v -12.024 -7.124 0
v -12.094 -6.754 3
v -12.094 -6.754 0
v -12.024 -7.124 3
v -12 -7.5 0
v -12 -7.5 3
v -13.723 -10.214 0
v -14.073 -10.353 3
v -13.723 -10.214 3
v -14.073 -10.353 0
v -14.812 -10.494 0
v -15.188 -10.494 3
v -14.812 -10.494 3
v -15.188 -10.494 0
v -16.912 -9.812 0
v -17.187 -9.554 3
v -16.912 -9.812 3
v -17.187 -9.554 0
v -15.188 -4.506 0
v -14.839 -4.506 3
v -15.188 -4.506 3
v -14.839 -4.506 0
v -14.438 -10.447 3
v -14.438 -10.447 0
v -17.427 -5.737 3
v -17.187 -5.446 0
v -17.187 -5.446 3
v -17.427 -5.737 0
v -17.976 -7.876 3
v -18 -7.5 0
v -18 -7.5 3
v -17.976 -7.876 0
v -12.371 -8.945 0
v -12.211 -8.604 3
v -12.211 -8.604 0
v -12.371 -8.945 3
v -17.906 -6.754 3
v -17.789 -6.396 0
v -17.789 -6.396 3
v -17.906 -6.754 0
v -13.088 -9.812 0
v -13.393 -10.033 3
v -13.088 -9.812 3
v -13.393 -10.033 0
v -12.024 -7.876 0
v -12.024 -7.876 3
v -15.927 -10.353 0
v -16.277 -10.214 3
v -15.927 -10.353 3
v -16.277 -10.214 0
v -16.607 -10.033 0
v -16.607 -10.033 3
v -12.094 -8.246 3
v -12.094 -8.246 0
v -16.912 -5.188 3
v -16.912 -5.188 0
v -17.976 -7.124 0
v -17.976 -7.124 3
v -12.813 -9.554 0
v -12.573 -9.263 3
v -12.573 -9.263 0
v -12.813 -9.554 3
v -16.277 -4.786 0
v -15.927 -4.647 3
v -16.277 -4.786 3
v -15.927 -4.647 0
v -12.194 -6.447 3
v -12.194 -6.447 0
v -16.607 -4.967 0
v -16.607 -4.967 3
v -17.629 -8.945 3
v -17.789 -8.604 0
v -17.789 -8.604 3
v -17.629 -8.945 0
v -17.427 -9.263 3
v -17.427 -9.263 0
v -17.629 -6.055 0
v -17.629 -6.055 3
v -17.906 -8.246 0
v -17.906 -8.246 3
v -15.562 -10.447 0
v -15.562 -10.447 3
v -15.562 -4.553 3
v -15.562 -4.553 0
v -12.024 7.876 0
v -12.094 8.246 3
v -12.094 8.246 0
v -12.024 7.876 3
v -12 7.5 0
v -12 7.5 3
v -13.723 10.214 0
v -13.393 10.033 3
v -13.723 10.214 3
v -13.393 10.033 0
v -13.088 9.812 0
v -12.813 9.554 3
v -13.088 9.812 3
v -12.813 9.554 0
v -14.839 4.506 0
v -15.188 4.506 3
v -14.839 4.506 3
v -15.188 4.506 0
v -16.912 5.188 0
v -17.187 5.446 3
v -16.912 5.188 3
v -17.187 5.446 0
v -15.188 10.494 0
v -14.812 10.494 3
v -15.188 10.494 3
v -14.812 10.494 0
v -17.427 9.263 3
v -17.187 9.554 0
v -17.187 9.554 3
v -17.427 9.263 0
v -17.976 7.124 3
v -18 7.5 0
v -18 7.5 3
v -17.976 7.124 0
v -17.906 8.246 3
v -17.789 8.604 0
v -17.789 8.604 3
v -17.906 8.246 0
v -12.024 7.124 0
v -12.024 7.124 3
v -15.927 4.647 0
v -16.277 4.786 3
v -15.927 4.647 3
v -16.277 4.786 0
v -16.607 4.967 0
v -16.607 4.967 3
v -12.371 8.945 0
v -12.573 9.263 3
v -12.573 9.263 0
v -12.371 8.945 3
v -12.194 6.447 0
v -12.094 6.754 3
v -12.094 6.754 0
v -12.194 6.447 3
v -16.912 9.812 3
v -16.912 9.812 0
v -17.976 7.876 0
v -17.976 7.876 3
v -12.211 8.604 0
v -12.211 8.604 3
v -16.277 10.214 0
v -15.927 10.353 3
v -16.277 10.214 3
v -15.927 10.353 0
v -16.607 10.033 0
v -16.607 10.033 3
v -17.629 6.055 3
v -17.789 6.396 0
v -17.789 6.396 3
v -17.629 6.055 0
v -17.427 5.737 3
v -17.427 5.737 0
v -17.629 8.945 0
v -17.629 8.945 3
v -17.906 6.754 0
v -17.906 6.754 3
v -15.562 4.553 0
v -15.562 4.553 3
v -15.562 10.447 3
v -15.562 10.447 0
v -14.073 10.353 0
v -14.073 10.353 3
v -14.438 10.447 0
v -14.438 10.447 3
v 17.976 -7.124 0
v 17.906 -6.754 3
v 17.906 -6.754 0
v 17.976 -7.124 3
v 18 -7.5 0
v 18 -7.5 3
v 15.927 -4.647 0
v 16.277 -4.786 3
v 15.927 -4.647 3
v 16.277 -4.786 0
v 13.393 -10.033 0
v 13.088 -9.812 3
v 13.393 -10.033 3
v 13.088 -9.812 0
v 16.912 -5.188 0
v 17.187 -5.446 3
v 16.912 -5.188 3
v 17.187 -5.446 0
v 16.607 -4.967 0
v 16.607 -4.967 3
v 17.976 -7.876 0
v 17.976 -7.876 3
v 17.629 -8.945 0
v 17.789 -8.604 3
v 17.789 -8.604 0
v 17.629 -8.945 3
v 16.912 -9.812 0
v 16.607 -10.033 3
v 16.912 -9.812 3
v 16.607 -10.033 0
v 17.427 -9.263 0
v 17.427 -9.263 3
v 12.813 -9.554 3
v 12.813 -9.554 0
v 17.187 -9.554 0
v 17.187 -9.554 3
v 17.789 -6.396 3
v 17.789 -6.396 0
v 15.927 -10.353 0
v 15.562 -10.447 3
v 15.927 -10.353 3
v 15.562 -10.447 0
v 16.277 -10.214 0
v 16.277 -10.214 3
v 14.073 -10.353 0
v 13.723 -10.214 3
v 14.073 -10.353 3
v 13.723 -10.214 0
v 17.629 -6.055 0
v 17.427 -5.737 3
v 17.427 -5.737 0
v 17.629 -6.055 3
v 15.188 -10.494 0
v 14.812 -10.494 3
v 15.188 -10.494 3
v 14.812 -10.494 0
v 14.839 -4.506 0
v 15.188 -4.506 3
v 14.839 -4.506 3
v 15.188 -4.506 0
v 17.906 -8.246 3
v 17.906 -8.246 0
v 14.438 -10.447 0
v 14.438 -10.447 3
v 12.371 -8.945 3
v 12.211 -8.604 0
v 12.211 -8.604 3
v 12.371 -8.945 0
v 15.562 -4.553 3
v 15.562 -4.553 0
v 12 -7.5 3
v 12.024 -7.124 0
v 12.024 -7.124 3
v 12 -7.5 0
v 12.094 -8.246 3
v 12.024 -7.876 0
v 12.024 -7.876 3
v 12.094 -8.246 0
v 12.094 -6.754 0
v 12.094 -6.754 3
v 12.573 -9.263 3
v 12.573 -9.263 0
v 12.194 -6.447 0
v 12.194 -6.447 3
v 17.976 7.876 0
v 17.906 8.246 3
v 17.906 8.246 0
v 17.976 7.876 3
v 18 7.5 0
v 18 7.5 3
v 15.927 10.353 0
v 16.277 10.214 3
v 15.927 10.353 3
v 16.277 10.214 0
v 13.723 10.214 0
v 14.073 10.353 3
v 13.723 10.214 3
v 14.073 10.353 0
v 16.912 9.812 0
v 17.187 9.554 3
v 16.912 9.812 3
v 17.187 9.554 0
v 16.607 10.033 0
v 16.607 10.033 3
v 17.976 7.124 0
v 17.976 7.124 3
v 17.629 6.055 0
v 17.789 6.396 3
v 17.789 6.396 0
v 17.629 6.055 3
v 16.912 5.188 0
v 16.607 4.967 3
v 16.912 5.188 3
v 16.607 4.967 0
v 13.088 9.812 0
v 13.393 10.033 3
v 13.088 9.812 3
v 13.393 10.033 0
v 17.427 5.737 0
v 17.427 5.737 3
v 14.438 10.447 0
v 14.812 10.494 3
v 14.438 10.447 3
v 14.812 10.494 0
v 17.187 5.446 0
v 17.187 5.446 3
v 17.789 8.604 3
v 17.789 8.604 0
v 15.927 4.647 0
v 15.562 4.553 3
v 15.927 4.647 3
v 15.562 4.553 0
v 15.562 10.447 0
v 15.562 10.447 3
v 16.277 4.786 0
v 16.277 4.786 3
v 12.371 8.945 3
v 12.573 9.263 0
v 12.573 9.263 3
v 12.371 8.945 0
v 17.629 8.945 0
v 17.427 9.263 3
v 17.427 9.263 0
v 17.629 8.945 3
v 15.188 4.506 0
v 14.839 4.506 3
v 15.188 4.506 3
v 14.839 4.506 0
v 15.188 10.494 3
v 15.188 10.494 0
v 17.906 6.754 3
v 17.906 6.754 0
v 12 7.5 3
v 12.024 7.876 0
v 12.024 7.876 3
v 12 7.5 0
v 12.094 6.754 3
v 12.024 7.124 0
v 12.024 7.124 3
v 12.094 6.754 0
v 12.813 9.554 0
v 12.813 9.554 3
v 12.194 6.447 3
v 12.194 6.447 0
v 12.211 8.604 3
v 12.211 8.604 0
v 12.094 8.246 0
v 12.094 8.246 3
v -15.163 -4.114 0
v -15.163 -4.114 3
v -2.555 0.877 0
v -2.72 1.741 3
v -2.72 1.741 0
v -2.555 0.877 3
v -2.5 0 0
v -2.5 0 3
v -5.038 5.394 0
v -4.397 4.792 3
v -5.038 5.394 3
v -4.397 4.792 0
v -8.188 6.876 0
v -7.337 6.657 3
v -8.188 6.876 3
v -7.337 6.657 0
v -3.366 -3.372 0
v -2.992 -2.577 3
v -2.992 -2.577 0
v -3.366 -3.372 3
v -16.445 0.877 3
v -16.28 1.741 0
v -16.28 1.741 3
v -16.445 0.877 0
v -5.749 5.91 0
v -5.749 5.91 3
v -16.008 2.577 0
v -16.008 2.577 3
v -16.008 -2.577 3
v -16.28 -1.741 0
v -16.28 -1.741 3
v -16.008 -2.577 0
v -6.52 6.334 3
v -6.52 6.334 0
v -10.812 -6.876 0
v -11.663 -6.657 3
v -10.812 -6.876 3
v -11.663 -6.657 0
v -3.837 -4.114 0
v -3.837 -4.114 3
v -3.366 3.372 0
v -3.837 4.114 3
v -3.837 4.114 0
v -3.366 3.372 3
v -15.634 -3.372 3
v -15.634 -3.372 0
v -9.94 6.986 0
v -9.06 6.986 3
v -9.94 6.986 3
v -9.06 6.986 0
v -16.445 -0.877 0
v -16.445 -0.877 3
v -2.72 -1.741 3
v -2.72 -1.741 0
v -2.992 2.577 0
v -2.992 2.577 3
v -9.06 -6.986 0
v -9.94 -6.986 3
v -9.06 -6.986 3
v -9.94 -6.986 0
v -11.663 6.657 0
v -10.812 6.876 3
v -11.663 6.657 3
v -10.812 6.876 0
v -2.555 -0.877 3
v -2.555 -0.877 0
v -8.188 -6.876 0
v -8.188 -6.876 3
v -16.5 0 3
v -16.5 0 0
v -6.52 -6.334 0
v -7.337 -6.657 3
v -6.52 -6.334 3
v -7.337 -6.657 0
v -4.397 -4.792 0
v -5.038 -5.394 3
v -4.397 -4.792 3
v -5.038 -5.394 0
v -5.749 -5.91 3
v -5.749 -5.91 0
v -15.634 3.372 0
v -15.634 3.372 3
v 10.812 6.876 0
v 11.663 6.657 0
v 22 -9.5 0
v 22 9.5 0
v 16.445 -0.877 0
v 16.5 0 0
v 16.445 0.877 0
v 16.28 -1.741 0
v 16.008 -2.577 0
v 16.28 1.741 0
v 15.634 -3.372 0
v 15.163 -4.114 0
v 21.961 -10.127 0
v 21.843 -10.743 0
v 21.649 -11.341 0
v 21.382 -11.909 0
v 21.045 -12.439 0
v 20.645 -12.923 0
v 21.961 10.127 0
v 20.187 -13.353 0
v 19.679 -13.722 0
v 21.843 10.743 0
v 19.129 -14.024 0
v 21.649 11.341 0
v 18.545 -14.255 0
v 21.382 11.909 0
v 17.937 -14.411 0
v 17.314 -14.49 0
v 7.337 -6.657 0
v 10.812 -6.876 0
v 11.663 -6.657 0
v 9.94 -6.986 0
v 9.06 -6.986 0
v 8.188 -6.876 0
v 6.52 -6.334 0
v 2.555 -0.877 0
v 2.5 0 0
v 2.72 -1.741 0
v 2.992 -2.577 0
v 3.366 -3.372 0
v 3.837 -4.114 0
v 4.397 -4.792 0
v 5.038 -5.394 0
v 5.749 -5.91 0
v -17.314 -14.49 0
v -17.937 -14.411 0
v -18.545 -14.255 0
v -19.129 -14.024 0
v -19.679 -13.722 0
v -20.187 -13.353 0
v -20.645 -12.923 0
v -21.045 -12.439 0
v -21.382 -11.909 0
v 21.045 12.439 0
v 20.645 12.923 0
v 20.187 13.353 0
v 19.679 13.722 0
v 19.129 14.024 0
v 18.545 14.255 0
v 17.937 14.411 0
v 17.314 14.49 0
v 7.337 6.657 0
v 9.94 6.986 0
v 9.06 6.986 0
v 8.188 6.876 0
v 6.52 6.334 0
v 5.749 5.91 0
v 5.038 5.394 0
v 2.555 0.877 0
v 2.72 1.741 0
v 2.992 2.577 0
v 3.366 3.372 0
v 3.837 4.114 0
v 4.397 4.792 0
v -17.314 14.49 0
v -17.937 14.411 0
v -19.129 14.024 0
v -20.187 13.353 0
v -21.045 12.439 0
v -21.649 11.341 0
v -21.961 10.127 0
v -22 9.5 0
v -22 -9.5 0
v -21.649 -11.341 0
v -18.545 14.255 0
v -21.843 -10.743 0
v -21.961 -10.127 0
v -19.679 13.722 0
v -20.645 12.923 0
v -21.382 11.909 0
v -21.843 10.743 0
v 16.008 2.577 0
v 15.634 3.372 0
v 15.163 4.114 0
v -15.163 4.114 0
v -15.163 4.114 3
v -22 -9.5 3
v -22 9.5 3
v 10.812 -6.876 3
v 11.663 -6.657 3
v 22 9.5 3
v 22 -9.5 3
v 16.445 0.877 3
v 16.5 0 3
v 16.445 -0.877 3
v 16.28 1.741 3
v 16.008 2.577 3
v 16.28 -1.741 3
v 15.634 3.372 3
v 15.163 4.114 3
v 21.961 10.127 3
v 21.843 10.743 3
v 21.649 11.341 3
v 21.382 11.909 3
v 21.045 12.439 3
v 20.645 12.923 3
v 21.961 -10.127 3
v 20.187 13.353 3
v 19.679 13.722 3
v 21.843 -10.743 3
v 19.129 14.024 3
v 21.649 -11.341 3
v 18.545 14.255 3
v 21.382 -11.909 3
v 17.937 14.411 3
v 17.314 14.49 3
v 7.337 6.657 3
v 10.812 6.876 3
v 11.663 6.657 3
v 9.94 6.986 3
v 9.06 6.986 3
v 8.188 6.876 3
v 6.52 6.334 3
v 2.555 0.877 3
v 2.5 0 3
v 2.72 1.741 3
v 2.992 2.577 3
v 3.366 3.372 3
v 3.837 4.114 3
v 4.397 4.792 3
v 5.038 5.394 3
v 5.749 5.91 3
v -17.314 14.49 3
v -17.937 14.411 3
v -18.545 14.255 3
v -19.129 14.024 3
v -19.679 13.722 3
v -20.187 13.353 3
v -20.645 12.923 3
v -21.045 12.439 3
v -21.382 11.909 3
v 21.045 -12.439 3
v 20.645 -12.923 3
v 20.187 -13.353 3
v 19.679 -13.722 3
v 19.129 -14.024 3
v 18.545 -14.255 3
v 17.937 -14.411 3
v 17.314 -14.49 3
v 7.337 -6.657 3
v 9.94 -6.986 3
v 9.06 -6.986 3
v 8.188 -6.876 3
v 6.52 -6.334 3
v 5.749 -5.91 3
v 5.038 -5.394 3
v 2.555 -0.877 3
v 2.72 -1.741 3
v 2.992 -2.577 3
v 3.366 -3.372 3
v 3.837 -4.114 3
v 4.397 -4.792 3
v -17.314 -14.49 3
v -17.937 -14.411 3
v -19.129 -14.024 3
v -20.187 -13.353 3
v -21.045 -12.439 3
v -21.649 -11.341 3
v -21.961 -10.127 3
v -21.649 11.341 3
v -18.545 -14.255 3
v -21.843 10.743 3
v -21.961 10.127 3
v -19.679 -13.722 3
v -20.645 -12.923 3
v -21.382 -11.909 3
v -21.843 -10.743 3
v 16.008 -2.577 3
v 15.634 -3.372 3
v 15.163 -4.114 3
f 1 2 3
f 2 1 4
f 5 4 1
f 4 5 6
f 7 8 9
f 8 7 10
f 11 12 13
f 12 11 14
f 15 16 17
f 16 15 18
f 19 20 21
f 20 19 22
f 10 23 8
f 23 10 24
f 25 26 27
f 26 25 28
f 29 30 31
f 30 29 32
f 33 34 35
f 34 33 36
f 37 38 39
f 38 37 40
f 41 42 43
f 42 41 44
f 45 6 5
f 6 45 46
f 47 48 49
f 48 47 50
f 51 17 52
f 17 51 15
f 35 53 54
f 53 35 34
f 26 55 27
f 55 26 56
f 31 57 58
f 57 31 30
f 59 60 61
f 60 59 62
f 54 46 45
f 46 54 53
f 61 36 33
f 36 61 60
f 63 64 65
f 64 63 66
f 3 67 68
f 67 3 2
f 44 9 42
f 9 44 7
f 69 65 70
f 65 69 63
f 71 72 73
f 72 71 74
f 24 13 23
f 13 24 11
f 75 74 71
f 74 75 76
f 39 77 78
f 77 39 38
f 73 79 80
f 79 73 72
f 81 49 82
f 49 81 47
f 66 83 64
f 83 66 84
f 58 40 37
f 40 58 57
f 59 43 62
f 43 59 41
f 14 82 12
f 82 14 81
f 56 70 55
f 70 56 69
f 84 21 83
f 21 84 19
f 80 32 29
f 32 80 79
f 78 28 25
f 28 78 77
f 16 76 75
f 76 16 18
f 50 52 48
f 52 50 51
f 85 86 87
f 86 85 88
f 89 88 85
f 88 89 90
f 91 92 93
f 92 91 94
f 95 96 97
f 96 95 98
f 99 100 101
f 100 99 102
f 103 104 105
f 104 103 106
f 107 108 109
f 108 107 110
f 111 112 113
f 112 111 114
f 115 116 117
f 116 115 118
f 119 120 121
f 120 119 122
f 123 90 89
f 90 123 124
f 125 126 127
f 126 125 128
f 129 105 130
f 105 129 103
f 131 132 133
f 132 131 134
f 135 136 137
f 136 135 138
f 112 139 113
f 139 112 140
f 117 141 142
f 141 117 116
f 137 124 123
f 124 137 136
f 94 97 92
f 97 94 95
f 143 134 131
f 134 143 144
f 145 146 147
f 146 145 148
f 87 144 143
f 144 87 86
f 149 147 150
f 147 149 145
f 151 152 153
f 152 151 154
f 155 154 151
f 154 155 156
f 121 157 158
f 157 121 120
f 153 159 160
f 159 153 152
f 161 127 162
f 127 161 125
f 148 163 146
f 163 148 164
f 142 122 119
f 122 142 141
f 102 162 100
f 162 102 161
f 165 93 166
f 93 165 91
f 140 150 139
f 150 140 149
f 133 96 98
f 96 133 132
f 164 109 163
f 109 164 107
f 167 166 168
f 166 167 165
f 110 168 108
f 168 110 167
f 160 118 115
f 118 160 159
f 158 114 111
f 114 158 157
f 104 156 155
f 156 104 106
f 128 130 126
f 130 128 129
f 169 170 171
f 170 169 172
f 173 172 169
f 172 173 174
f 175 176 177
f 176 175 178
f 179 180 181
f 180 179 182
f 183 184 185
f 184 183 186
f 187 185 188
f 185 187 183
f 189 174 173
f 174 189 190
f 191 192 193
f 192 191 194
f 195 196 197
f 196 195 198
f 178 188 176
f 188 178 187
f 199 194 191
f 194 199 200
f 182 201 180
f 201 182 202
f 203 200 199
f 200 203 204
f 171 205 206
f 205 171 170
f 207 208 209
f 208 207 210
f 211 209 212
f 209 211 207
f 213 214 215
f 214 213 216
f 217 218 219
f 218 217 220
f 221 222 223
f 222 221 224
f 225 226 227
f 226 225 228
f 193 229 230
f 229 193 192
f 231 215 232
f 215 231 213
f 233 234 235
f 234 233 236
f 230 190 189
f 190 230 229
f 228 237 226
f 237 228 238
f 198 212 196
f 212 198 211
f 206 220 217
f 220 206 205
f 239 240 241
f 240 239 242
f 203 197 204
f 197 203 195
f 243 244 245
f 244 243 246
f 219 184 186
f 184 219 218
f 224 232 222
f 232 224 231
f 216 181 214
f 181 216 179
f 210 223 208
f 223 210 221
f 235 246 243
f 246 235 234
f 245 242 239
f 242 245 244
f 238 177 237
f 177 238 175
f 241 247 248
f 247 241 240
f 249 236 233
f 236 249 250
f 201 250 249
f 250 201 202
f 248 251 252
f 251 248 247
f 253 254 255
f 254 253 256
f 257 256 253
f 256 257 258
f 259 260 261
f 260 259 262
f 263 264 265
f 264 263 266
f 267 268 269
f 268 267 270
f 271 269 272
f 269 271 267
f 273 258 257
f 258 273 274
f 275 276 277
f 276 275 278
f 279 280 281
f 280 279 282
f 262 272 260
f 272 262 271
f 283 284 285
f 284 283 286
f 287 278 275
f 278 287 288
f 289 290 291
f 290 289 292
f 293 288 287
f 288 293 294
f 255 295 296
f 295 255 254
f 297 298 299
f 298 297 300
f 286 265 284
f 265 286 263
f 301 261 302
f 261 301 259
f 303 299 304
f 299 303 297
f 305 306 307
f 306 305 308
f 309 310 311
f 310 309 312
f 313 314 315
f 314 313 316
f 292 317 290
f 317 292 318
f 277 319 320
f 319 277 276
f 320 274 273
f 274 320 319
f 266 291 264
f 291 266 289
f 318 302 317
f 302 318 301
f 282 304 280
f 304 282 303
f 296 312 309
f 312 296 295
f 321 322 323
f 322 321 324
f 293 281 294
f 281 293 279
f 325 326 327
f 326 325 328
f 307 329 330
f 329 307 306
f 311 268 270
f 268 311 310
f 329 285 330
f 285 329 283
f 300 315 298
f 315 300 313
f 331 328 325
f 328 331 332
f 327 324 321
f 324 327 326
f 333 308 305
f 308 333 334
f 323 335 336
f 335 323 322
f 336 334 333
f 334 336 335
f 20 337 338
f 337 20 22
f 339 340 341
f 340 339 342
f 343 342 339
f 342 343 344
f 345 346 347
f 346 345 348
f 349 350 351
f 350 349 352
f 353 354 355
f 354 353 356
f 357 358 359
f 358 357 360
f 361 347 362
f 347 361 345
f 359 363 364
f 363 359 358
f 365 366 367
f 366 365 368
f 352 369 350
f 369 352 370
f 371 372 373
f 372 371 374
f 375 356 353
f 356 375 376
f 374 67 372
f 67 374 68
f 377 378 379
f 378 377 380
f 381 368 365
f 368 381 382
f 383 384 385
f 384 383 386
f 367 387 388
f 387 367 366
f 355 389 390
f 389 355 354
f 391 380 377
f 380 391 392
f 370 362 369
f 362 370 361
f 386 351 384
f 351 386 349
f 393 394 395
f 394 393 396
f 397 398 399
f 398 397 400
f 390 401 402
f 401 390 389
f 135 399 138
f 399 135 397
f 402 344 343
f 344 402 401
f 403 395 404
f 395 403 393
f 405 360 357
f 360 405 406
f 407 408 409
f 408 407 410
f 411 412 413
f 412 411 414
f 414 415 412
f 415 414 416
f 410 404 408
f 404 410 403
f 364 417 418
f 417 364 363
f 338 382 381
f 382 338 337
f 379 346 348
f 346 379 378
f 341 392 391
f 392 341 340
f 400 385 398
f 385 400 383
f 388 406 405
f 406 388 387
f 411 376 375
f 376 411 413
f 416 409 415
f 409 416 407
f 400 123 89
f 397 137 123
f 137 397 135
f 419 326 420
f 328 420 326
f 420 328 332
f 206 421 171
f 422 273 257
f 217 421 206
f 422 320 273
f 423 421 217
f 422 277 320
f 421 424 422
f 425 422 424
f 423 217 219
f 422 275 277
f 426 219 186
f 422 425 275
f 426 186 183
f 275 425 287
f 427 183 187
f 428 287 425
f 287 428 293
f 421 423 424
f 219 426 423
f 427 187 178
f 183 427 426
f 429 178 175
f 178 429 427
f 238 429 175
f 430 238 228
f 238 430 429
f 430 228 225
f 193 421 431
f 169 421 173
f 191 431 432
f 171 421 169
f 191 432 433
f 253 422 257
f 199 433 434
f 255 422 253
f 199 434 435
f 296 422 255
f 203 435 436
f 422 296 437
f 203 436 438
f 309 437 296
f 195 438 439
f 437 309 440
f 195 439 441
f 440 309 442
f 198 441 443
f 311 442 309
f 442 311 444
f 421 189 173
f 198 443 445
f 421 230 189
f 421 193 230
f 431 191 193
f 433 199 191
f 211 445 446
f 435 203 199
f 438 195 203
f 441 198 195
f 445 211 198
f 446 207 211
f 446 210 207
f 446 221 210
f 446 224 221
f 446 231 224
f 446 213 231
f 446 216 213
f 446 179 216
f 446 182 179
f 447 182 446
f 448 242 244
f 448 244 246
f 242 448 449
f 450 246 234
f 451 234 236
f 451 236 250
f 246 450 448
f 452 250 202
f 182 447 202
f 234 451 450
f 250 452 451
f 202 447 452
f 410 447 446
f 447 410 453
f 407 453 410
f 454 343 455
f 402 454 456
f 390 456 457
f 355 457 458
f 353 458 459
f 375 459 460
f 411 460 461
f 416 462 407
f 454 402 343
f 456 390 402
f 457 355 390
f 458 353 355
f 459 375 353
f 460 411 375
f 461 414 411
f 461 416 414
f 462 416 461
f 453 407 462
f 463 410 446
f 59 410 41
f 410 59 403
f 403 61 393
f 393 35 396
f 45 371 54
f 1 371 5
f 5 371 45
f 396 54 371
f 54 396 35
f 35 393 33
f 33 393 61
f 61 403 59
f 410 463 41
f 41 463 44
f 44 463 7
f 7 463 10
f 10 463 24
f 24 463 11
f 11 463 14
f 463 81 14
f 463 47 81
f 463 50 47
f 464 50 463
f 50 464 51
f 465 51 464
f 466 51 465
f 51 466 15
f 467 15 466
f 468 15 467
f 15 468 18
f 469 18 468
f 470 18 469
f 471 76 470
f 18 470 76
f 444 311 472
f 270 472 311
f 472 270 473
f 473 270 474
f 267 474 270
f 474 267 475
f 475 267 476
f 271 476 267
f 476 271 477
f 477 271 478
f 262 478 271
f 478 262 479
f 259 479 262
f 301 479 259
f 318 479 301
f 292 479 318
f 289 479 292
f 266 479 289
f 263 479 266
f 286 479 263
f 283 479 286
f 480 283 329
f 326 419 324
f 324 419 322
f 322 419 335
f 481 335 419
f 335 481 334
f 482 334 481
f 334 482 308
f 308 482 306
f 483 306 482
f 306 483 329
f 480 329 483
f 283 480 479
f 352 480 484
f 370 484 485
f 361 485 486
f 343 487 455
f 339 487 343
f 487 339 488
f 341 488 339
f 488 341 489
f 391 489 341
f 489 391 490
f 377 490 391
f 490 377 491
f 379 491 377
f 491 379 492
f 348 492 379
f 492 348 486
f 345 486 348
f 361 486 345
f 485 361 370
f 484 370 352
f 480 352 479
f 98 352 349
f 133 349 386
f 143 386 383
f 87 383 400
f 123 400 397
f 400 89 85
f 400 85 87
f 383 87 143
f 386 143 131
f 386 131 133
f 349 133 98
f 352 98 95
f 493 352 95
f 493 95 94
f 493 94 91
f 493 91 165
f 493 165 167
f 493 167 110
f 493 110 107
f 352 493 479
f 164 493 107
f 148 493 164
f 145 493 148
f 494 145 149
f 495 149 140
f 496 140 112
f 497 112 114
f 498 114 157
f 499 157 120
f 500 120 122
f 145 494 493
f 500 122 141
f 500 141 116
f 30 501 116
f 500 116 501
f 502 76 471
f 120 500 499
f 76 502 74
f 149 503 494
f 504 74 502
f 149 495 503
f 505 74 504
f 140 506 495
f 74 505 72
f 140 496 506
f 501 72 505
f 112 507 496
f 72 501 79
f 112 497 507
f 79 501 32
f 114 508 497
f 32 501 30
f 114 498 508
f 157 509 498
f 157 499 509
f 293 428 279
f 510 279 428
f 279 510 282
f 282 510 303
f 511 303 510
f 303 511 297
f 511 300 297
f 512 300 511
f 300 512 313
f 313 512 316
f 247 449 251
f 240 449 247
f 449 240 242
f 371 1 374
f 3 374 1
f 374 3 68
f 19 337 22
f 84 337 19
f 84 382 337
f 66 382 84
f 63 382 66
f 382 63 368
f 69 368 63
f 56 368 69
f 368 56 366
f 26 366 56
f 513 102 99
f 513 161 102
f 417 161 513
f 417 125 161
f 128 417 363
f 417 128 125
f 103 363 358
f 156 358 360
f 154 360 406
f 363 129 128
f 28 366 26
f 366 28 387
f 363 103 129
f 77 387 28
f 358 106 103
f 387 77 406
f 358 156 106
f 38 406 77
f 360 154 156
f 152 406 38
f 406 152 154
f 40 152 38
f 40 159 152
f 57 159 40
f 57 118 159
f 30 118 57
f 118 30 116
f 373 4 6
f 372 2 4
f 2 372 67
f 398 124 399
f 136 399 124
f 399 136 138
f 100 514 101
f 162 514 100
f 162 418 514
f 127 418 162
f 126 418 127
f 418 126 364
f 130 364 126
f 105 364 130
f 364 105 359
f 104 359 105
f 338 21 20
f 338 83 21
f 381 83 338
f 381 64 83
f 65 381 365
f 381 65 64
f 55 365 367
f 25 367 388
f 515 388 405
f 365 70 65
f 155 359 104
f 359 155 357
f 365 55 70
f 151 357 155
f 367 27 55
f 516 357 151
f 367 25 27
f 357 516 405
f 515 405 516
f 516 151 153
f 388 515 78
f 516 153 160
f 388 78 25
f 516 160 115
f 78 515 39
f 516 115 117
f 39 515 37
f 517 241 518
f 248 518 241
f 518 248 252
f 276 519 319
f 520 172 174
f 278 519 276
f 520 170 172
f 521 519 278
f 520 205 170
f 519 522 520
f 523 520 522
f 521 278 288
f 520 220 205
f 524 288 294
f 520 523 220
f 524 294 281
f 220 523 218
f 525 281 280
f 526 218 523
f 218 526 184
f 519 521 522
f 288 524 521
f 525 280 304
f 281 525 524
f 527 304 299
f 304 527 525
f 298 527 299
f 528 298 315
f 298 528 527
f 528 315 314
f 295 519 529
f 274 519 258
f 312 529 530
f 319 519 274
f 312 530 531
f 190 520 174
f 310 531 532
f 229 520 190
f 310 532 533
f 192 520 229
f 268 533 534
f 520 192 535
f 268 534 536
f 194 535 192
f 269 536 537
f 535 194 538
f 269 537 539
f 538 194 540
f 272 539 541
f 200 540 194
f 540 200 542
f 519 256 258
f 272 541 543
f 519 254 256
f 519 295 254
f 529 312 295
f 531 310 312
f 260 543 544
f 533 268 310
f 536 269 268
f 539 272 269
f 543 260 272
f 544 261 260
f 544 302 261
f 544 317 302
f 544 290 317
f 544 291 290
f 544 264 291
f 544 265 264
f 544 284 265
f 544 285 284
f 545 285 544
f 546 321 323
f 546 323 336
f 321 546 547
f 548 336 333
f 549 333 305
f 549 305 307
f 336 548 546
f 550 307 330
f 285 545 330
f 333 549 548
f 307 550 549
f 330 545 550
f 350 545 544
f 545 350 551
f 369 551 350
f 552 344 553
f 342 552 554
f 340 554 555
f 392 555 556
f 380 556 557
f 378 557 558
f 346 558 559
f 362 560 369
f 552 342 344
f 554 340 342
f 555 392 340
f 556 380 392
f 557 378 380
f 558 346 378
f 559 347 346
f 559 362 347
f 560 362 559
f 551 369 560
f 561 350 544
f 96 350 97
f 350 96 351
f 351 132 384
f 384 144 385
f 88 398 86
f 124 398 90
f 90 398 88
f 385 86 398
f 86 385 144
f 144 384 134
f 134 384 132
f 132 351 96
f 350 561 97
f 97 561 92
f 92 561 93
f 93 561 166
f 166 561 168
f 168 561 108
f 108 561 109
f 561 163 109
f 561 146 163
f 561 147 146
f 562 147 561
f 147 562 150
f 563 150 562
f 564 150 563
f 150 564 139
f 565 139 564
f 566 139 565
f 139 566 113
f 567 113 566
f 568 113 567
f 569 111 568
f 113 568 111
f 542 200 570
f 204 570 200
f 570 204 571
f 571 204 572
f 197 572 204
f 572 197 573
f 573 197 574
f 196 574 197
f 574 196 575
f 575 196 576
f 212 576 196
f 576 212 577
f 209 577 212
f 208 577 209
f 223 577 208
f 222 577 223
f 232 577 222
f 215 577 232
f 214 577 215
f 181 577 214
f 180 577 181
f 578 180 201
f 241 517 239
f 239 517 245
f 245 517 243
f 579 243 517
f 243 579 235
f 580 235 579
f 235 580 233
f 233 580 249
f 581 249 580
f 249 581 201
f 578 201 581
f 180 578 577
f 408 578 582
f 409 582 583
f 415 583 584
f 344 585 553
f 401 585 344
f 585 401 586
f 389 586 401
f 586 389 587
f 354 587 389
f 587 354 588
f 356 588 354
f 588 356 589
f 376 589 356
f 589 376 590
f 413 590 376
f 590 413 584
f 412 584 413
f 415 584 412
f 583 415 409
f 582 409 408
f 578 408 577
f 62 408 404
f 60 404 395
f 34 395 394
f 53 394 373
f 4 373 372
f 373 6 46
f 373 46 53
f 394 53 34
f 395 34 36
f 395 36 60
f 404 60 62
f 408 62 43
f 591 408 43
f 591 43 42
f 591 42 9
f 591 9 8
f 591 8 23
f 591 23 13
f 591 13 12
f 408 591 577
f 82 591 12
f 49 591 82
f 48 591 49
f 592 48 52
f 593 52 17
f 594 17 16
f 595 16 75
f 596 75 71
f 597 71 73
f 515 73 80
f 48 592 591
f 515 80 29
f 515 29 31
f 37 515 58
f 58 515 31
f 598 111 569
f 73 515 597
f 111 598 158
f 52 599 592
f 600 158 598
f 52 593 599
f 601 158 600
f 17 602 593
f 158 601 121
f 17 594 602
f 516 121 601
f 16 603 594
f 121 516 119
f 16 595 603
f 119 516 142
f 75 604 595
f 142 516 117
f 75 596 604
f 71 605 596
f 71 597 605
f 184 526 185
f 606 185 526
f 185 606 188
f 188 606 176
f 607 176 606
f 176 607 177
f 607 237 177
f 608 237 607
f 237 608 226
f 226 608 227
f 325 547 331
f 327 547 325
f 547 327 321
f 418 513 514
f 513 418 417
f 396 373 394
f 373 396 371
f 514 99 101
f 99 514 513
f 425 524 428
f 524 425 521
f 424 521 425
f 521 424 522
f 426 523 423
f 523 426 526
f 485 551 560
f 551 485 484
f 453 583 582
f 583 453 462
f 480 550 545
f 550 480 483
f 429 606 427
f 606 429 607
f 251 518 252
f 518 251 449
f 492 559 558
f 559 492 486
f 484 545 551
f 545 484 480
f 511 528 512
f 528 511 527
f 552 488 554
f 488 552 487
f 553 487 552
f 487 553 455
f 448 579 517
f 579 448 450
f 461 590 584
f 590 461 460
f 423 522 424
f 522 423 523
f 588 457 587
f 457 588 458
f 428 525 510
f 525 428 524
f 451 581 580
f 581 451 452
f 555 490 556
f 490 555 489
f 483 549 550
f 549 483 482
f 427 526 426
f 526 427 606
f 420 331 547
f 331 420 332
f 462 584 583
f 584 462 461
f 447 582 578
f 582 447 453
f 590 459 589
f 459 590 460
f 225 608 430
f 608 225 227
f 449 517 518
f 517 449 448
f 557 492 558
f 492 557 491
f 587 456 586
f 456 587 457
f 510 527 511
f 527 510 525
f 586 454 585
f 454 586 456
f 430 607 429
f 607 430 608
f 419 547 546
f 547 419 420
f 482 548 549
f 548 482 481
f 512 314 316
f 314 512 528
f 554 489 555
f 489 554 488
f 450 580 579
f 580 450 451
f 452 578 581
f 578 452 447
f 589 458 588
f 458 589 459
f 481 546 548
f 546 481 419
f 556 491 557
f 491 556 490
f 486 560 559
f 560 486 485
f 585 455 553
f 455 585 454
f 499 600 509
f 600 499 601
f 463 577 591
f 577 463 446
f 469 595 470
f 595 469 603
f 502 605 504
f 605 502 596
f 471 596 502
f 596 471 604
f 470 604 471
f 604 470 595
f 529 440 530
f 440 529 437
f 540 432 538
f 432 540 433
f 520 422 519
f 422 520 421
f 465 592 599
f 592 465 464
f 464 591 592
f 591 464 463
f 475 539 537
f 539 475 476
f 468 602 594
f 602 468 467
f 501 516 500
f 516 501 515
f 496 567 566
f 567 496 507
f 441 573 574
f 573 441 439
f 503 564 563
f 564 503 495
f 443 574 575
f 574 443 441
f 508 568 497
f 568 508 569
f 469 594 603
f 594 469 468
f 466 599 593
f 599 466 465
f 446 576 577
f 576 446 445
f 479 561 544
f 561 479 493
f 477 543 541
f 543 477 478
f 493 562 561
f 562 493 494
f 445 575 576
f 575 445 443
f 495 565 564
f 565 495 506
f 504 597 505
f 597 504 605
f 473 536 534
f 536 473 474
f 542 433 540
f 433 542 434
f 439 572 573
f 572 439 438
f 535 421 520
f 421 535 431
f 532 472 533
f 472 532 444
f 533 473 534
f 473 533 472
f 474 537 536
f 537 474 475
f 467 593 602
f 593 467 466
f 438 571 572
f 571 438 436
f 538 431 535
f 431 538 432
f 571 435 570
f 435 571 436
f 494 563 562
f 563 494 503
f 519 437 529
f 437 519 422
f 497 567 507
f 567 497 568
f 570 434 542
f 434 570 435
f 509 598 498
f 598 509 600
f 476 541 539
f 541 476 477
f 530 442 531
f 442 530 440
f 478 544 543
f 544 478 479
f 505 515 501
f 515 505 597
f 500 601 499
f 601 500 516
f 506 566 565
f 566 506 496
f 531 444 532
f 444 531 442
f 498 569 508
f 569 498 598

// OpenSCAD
$fn = 50;


difference() {
	union() {
		hull() {
			translate(v = [-17.0000000000, 9.5000000000, 0]) {
				cylinder(h = 3, r = 5);
			}
			translate(v = [17.0000000000, 9.5000000000, 0]) {
				cylinder(h = 3, r = 5);
			}
			translate(v = [-17.0000000000, -9.5000000000, 0]) {
				cylinder(h = 3, r = 5);
			}
			translate(v = [17.0000000000, -9.5000000000, 0]) {
				cylinder(h = 3, r = 5);
			}
		}
	}
	union() {
		#translate(v = [-15.0000000000, -7.5000000000, -100.0000000000]) {
			cylinder(h = 200, r = 3.0000000000);
		}
		#translate(v = [-15.0000000000, 7.5000000000, -100.0000000000]) {
			cylinder(h = 200, r = 3.0000000000);
		}
		#translate(v = [15.0000000000, -7.5000000000, -100.0000000000]) {
			cylinder(h = 200, r = 3.0000000000);
		}
		#translate(v = [15.0000000000, 7.5000000000, -100.0000000000]) {
			cylinder(h = 200, r = 3.0000000000);
		}
		#translate(v = [-9.5000000000, 0, 0]) {
			cylinder(h = 3, r = 7.0000000000);
		}
		#translate(v = [9.5000000000, 0, 0]) {
			cylinder(h = 3, r = 7.0000000000);
		}
	}
}
